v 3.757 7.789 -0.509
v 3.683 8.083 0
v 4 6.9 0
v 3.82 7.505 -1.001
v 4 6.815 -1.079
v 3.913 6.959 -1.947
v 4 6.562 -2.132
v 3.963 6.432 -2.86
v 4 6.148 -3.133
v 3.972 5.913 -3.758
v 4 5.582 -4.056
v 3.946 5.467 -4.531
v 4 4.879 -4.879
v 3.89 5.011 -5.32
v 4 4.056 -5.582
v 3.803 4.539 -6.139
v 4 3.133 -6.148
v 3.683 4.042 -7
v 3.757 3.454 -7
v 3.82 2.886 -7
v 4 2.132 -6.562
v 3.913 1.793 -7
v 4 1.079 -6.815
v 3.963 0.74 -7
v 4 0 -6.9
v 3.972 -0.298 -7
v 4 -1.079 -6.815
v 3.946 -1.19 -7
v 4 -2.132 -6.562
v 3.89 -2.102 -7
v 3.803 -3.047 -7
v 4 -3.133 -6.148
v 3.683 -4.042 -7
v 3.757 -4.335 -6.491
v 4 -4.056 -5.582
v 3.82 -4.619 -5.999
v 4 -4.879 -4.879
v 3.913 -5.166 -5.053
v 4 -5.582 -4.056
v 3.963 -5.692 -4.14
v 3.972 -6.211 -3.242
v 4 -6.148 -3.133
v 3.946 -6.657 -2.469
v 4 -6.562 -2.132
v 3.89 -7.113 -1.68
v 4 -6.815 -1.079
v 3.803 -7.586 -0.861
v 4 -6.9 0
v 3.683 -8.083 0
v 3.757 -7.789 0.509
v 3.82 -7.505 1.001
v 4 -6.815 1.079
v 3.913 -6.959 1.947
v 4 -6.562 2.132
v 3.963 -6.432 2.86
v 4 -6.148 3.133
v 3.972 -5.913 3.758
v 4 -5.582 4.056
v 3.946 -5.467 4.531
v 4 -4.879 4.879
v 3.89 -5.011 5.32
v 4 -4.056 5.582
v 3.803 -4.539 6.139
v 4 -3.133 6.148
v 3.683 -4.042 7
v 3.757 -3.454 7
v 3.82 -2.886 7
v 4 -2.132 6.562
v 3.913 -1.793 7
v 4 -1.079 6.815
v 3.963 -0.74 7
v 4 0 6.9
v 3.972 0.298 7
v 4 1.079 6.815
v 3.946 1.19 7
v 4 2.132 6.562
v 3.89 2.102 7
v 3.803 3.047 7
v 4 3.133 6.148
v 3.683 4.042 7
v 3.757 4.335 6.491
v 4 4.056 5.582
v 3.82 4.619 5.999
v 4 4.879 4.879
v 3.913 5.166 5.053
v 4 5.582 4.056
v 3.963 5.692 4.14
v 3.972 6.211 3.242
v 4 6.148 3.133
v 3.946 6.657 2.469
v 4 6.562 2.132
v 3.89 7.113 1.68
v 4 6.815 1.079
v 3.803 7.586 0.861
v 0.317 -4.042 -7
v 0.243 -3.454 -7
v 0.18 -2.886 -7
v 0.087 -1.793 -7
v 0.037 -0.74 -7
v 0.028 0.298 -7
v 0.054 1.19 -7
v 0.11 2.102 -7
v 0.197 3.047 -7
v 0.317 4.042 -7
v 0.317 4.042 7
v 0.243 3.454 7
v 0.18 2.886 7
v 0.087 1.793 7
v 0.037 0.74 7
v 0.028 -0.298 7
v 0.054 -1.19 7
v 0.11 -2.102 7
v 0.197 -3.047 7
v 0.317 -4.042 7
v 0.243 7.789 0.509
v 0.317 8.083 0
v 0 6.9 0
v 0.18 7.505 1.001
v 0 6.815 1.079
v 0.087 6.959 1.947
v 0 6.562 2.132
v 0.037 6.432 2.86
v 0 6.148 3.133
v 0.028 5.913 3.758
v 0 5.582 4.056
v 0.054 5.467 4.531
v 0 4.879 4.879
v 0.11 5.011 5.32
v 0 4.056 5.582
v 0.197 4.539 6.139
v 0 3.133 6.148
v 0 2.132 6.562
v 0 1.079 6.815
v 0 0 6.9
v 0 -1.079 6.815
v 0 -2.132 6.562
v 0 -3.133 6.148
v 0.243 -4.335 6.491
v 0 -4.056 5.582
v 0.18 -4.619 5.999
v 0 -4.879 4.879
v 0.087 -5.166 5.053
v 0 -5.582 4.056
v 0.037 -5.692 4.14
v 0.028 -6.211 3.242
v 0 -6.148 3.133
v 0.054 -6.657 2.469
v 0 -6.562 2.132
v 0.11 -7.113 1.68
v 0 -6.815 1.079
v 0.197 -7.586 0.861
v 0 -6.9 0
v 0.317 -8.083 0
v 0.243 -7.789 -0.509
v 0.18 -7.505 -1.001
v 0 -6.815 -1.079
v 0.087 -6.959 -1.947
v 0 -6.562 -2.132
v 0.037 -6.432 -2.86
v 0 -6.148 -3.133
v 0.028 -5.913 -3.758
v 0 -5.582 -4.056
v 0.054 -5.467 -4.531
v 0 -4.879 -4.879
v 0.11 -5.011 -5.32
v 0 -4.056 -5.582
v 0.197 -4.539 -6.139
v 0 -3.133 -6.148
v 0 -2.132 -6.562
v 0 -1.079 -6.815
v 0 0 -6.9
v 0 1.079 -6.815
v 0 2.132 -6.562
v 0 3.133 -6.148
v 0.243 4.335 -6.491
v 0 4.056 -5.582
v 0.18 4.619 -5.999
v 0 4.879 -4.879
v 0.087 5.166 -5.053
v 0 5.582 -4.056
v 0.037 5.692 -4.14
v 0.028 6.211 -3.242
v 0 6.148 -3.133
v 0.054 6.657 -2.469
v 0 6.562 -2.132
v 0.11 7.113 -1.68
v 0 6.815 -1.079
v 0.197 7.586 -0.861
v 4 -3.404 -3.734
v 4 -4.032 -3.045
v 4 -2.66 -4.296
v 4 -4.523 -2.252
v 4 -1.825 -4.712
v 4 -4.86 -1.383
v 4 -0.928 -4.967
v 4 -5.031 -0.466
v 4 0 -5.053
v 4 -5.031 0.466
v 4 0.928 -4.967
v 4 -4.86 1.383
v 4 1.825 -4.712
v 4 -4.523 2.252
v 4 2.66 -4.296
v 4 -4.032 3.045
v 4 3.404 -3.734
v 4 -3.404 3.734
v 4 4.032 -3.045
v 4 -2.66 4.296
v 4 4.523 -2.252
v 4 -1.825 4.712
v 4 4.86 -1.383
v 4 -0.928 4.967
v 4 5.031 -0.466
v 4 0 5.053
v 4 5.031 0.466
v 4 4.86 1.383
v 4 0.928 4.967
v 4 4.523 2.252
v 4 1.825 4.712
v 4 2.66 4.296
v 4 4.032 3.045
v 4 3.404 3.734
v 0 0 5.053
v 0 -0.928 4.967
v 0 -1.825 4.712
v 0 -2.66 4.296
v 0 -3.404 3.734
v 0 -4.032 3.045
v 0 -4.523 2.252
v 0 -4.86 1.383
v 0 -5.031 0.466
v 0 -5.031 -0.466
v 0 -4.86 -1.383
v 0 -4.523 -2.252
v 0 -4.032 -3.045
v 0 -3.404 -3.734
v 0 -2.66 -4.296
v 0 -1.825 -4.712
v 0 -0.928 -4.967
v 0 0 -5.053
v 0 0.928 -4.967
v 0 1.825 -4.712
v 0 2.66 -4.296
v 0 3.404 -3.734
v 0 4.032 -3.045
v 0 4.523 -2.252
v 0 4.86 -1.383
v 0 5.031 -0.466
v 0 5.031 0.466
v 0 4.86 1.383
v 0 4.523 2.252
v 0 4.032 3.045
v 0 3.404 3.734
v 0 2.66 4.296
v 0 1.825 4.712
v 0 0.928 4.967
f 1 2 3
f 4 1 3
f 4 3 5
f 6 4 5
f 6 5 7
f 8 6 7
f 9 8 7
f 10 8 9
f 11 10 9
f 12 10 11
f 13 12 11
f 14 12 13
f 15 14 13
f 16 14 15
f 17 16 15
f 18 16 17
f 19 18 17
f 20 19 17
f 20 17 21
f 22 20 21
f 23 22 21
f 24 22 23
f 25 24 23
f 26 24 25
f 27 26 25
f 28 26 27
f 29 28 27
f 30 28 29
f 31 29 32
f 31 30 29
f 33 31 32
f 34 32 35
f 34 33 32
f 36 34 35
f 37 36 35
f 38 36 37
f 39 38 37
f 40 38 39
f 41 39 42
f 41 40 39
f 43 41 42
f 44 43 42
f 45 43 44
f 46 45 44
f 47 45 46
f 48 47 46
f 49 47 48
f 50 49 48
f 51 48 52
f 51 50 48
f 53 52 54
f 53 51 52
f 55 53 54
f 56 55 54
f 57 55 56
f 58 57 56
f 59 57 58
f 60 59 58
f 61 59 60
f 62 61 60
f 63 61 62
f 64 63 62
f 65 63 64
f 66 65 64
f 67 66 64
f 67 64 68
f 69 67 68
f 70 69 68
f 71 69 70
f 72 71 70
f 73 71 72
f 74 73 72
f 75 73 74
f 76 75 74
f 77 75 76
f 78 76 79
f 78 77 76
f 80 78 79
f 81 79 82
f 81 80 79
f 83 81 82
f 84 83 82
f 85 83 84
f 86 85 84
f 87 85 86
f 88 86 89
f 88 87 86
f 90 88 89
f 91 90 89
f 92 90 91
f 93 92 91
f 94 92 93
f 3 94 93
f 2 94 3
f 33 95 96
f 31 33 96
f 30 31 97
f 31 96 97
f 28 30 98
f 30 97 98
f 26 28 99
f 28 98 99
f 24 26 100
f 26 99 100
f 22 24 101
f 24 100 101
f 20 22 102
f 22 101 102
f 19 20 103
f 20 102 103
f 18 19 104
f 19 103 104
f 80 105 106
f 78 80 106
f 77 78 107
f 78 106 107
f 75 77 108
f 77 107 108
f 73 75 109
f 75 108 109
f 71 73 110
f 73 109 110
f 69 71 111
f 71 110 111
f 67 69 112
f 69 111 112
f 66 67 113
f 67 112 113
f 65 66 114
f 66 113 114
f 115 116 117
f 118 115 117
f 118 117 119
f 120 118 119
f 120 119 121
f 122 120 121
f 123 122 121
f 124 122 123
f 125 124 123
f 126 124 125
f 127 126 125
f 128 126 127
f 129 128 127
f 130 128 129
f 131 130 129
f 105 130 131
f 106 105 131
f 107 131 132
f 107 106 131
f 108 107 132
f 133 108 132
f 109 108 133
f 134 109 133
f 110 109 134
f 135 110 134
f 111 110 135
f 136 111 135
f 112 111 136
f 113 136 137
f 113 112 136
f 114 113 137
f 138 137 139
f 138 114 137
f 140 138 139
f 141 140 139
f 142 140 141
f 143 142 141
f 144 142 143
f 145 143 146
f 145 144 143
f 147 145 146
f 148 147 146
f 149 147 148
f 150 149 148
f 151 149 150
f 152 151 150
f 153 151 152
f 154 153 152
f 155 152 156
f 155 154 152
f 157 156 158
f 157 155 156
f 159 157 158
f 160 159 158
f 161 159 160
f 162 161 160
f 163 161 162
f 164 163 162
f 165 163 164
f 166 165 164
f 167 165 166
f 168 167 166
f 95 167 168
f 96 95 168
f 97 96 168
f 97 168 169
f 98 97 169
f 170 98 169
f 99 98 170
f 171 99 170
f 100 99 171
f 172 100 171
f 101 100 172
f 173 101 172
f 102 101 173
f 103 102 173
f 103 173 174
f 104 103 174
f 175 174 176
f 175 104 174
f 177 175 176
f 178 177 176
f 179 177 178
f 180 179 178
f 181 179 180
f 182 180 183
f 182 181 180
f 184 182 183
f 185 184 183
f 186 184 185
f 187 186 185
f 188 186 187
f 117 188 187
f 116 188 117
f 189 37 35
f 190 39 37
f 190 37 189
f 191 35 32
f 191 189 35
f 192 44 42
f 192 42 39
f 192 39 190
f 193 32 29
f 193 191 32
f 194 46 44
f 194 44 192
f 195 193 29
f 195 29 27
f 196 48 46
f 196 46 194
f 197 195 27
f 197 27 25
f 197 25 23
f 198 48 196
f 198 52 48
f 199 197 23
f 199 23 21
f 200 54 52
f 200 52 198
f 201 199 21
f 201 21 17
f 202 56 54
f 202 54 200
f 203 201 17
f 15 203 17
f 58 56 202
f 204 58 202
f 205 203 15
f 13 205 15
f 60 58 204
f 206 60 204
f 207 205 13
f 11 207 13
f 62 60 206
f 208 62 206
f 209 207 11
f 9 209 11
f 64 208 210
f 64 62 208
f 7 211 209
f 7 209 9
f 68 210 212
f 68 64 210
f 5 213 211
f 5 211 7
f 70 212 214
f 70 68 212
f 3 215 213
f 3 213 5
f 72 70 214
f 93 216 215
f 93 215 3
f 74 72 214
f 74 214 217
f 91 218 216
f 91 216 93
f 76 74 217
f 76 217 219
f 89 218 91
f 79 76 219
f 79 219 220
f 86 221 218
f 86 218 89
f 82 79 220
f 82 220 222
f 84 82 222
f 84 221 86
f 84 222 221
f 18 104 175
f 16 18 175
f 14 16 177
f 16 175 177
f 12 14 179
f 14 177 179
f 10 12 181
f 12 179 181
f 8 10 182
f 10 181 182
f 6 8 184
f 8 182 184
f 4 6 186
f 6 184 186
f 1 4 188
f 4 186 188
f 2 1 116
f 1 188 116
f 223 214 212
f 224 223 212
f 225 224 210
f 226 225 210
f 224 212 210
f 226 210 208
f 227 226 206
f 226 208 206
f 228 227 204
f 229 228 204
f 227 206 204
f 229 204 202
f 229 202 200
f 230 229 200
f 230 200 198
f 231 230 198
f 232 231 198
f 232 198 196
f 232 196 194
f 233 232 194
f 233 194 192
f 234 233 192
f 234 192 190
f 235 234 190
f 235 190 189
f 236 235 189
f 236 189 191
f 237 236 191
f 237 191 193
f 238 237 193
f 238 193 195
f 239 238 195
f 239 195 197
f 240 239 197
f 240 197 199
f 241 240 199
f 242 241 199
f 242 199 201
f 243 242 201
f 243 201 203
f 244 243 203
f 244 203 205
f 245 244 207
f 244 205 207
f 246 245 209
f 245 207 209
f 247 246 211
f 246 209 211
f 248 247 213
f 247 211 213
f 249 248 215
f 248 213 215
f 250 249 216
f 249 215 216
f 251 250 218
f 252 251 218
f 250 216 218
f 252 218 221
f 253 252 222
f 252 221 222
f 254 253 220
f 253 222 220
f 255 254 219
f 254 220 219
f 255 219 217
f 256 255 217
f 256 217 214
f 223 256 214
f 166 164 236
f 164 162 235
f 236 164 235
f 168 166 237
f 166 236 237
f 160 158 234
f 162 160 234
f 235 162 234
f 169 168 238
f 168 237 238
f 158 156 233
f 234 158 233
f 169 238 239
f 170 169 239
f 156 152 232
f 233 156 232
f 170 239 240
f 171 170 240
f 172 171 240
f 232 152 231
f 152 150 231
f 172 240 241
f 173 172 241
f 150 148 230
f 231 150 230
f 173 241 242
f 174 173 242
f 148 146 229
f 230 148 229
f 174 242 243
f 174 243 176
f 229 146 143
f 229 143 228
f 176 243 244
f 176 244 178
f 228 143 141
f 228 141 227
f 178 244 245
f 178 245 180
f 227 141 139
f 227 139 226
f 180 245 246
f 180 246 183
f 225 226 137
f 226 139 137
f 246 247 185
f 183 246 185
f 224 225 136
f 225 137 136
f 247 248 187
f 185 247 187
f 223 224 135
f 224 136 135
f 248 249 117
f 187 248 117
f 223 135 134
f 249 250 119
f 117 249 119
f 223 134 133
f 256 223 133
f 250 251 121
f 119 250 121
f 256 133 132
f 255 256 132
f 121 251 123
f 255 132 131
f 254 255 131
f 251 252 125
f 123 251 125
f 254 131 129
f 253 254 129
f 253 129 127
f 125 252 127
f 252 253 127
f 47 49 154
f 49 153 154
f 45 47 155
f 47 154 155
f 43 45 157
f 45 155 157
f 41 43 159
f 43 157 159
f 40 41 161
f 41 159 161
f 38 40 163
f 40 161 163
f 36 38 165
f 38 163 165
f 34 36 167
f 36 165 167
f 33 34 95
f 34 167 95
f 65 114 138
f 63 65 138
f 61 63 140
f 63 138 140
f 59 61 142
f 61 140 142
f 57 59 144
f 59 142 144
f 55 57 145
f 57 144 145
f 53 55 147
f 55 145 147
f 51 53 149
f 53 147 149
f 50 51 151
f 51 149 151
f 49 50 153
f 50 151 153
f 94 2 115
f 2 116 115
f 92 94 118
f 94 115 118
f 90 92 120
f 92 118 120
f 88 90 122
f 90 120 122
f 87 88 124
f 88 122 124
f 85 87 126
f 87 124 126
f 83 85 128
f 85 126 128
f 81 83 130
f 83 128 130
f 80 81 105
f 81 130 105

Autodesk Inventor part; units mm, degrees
sketch "Sketch_1" plane through (0, 0, 0) normal (0, 0, 1) x (1, 0, 0)
  line L0 (4, 0) -> (0, 0)
  line L1 (0, 0) -> (0, 6.9)
  line L2 (0, 6.9) -> (0.3698, 8.28)
  line L3 (0.3698, 8.28) -> (3.6302, 8.28)
  line L4 (3.6302, 8.28) -> (4, 6.9)
  line L5 (4, 6.9) -> (4, 0)
  line L6 (4, 0) -> (0, 0)
revolve "Revolution1" add sketch "Sketch_1" angle 360 about axis through (4, 0, 0) along (1, 0, 0)
sketch "Sketch2" plane through (0, 0, 0) normal (-1, 0, 0) x (0, 0, 1)
  point P0 (0, 0)
hole "Hole1" at (0, 0, 0) direction (1, 0, 0) diameter 10.106 depth 4 thread size "M12x1.75" class "6H" standard "ISO Metric profile"
sketch "Sketch_3" plane through (0, 0, 0) normal (1, 0, 0) x (0, 1, 0)
  line L0 (14, 14) -> (-14, 14)
  line L1 (-14, 14) -> (-14, -14)
  line L2 (-14, -14) -> (14, -14)
  line L3 (14, -14) -> (14, 14)
  line L4 (-4.0415, 7) -> (-8.0829, 0)
  line L5 (-8.0829, 0) -> (-4.0415, -7)
  line L6 (-4.0415, -7) -> (4.0415, -7)
  line L7 (4.0415, -7) -> (8.0829, 0)
  line L8 (8.0829, 0) -> (4.0415, 7)
  line L9 (4.0415, 7) -> (-4.0415, 7)
extrude "Extrusion1" cut sketch "Sketch_3" along normal blind 4
ref_plane "IP_Holder_XY" through (0, 0, 0) normal (-1, 0, 0) x (0, 0, -1)
ref_plane "IP_Holder_YZ" through (0, 0, 0) normal (0, 0, -1) x (0, -1, 0)
ref_plane "IP_Holder_ZX" through (0, 0, 0) normal (0, -1, 0) x (-1, 0, 0)
properties part number "MN12P1(MNF12P1)"
